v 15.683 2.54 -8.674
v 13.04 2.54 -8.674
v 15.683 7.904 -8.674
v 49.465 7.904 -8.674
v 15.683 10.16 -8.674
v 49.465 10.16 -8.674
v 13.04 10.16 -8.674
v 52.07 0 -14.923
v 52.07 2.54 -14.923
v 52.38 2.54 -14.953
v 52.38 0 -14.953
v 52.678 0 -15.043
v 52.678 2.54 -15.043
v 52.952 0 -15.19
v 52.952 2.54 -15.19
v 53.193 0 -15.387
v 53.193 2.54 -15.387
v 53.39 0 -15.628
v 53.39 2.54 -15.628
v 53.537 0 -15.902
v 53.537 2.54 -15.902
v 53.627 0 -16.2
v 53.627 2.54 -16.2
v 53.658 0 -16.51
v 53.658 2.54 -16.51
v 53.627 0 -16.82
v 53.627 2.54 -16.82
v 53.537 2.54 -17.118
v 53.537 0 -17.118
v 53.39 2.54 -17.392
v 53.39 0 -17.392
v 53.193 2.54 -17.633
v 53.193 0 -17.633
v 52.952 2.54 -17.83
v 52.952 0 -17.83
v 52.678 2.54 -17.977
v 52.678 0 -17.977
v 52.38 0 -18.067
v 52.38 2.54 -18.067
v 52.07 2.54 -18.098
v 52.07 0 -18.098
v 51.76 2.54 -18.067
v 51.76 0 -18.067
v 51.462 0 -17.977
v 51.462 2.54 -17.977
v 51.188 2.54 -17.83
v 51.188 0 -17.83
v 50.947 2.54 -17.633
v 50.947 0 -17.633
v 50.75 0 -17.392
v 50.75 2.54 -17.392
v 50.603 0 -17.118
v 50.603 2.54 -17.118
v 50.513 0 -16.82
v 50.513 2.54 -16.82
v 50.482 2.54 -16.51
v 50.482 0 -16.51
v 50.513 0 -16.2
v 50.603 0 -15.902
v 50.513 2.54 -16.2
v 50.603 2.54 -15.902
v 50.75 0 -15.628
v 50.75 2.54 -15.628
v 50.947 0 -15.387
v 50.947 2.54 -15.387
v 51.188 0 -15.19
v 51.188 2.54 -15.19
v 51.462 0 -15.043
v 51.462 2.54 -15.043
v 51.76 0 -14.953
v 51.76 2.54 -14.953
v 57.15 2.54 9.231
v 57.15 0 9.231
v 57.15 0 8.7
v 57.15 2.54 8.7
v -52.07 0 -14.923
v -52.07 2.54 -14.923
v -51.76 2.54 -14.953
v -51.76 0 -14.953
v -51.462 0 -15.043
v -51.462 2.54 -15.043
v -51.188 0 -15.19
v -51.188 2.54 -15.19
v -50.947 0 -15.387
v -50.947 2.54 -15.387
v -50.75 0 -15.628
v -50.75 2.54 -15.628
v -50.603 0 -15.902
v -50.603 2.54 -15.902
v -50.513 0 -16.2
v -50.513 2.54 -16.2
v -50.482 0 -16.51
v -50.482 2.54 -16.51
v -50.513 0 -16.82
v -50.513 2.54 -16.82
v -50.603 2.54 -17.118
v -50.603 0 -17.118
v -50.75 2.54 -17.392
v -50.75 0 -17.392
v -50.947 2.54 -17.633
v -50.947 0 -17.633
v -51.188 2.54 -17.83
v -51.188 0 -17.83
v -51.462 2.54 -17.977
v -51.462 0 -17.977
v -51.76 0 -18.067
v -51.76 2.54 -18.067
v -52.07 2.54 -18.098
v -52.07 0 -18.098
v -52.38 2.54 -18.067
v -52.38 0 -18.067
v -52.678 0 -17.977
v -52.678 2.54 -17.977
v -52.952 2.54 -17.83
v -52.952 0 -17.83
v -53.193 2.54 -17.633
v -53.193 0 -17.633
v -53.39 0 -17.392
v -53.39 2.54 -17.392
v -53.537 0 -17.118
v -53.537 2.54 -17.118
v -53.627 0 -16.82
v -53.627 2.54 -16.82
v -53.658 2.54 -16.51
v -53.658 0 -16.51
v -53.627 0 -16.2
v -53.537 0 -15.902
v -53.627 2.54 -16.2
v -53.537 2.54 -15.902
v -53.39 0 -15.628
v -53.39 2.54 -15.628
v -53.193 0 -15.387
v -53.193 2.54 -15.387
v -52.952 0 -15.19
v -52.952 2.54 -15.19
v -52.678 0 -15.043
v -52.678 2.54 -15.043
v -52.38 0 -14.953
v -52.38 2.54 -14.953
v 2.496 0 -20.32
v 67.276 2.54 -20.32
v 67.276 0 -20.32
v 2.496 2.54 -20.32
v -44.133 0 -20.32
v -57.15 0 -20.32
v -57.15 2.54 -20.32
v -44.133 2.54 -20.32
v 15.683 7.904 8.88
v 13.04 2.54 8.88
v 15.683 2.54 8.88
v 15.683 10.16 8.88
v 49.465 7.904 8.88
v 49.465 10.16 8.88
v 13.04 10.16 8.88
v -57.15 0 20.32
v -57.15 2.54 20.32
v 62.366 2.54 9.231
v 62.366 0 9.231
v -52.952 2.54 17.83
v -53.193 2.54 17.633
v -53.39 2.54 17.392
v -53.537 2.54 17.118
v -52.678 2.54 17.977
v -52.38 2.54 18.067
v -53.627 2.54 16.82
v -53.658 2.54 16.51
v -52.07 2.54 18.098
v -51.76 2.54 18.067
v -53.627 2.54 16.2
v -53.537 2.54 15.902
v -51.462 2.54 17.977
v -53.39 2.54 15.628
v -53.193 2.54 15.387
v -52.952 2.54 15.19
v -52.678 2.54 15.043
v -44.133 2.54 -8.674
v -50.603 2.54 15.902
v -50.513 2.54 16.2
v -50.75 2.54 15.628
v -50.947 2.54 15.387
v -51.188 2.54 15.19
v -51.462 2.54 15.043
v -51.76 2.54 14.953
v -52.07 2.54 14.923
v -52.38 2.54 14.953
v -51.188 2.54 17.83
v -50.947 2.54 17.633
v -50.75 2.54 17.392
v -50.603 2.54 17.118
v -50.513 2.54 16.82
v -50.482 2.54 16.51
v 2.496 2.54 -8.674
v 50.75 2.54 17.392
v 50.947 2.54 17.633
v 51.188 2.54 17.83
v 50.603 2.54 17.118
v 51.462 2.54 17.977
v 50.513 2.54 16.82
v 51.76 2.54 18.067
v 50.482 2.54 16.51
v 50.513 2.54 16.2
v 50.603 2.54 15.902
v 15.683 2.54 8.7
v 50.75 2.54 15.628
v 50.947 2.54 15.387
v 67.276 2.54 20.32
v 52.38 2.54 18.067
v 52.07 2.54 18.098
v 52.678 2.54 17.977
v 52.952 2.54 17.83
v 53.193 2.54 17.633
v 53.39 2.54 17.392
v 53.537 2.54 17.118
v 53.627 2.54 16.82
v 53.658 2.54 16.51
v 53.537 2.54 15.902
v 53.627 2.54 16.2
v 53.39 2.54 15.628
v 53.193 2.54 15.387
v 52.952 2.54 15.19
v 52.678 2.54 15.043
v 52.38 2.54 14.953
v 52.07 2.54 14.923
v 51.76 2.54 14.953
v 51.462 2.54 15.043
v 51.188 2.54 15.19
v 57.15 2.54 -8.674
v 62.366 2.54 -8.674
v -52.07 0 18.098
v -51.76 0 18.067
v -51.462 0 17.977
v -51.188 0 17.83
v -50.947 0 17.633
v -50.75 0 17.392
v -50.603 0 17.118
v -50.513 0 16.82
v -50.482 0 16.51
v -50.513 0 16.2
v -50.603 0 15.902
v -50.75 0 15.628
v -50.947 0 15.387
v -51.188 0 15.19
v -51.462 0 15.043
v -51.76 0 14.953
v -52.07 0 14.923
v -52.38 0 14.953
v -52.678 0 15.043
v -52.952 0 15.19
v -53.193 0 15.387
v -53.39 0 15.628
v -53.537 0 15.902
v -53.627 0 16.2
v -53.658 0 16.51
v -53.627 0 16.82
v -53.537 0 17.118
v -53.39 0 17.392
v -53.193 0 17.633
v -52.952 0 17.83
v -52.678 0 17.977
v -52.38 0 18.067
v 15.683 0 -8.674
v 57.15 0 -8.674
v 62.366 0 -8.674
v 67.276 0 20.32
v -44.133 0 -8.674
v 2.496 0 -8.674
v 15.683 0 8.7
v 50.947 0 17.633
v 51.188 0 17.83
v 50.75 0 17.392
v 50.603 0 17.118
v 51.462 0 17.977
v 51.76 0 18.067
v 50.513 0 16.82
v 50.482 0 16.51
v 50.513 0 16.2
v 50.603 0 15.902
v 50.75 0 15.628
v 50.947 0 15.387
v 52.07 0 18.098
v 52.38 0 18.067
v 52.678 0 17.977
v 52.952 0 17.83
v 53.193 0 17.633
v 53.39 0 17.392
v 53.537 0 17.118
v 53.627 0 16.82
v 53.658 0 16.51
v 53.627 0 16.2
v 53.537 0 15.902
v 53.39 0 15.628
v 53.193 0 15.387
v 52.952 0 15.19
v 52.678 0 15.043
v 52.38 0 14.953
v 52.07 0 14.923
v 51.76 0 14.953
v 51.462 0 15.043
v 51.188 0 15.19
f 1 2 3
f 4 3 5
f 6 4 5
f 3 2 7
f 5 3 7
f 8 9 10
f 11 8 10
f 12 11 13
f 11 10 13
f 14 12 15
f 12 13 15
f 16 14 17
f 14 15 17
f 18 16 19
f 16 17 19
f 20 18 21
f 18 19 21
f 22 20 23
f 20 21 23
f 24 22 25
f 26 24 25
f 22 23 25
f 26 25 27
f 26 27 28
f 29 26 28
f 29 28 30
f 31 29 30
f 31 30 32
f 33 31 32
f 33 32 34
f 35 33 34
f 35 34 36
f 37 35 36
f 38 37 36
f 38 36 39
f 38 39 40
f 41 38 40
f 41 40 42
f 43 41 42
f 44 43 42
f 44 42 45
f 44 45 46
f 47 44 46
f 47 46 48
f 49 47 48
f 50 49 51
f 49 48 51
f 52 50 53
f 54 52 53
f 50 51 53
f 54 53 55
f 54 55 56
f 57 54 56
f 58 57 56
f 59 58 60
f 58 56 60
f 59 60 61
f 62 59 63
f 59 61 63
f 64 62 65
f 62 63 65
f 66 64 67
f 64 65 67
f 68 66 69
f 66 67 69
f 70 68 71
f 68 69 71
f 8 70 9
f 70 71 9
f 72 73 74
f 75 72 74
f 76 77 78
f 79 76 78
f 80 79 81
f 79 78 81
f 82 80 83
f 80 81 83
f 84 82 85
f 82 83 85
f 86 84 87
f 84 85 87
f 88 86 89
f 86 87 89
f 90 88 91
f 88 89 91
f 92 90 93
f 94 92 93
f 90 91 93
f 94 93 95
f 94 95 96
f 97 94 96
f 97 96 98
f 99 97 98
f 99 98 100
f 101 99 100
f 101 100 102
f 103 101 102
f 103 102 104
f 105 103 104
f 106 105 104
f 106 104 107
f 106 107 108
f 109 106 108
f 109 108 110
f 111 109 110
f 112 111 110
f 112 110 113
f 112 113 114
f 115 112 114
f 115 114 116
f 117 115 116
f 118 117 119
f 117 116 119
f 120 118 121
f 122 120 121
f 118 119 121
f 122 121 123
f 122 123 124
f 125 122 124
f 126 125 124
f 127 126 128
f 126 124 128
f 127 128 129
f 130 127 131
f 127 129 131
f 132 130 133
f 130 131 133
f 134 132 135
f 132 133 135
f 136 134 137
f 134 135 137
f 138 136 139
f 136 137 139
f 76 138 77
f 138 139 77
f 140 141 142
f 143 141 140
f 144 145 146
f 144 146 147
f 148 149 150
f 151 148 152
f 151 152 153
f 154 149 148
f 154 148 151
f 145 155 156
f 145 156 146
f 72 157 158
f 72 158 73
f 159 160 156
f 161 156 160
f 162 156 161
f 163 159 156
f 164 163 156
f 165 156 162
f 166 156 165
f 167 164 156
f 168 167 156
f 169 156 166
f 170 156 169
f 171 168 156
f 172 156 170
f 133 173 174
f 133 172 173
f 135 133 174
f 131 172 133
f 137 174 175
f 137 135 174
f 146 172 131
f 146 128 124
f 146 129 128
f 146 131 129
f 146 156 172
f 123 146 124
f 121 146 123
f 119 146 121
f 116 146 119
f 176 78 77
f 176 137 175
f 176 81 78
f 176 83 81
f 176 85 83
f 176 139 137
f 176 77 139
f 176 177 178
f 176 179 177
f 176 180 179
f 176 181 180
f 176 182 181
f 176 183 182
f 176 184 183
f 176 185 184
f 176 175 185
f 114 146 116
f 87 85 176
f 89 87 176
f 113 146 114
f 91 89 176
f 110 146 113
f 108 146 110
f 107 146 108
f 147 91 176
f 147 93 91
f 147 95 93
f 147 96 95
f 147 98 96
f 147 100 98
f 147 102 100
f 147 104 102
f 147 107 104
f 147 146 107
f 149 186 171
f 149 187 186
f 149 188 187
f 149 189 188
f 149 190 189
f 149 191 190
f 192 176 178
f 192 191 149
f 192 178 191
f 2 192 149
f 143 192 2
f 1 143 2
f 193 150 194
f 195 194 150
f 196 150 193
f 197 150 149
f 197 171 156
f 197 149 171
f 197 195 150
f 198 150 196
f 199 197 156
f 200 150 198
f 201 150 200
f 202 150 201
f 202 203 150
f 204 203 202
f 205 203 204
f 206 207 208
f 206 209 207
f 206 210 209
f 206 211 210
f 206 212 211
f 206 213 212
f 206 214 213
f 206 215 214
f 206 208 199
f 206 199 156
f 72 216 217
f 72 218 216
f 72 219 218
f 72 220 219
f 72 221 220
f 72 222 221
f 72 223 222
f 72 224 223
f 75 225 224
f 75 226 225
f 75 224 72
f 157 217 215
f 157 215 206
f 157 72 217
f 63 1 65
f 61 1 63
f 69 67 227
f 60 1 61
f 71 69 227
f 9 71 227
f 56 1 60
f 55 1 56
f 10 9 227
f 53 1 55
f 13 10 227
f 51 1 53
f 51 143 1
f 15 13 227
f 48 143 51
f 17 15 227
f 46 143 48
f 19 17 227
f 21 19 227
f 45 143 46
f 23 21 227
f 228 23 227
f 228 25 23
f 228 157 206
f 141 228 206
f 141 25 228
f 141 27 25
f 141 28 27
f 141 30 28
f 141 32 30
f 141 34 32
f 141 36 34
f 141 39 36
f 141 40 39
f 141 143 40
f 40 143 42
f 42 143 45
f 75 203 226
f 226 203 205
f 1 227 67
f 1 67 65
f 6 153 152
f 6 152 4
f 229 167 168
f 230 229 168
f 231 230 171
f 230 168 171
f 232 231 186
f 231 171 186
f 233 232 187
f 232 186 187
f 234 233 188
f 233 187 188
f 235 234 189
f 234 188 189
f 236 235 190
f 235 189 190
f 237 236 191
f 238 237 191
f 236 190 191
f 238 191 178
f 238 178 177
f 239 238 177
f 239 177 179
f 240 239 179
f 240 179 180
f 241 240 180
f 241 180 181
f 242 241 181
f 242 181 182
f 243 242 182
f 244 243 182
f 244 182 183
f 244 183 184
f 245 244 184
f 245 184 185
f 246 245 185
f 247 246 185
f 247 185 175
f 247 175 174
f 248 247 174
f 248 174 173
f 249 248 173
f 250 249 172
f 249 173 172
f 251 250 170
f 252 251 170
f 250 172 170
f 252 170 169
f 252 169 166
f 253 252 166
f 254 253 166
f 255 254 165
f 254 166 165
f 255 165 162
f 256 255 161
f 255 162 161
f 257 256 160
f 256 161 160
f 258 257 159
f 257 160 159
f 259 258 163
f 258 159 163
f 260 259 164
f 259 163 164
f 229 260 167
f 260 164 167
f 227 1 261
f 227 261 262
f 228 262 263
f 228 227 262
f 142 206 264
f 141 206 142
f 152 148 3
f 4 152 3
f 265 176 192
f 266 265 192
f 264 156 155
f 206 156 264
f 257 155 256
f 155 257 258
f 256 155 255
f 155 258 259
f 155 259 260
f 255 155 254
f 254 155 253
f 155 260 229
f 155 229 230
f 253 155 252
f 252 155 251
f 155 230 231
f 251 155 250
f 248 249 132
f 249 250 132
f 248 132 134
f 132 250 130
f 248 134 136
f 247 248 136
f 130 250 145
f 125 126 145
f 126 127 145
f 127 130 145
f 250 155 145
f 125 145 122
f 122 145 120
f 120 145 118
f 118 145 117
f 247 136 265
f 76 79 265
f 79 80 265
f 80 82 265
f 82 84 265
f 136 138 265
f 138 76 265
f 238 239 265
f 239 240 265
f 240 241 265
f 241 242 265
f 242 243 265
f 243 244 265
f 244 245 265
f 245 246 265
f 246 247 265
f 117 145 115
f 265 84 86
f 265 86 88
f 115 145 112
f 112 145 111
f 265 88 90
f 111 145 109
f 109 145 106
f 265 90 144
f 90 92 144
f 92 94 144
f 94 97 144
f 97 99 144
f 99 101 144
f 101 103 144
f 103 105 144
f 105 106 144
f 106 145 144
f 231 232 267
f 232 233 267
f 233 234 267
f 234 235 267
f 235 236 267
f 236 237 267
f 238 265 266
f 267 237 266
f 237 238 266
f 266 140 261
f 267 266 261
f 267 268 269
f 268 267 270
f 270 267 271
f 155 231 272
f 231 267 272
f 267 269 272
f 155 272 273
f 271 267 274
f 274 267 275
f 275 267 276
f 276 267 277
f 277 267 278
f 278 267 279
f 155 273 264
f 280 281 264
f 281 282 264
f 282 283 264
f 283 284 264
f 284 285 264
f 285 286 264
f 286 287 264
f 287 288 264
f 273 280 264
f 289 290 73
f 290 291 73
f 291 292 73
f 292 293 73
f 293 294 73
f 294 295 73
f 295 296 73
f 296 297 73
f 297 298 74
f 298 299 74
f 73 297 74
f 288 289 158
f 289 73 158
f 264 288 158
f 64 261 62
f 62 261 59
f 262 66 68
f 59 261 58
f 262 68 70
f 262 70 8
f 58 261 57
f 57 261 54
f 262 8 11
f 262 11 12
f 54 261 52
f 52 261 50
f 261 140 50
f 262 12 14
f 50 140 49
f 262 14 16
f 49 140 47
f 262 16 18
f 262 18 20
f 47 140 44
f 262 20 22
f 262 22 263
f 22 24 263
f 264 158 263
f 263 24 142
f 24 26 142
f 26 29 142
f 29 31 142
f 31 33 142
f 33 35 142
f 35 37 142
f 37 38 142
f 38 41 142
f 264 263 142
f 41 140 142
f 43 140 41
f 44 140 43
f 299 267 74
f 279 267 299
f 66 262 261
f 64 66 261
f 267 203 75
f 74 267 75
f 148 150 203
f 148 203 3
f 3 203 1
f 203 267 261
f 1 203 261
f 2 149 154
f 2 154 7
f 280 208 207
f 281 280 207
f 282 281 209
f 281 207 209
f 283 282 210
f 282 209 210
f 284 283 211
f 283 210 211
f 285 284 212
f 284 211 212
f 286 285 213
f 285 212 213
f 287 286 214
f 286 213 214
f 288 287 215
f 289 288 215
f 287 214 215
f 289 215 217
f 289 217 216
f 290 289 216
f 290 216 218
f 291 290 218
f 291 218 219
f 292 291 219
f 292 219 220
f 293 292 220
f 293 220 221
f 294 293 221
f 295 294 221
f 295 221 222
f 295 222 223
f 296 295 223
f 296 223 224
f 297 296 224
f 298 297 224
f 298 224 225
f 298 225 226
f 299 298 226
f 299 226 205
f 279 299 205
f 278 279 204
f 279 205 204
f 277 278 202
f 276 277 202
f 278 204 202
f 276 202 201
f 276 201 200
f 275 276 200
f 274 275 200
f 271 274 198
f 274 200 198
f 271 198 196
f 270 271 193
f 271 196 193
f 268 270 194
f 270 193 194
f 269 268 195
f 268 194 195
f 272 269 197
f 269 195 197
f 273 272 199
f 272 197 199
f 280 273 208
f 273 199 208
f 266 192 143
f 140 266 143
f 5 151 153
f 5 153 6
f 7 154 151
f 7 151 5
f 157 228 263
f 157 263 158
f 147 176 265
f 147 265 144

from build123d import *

# Parameters (mm, degrees)
SKETCH1_W           = 114.3
SKETCH1_H           = 40.64
BOSS_EXTRUDE1_DEPTH = 2.54
SKETCH2_R           = 1.5875
CUT_EXTRUDE2_DEPTH  = 61.708125486
SKETCH3_W           = 43.201910461
SKETCH3_H           = 17.373570515
SKETCH3_W_2         = 46.628586193
SKETCH3_H_2         = 22.401940477
CUT_EXTRUDE3_DEPTH  = 61.708125486
SKETCH4_W           = 2.643760601
SKETCH4_H           = 17.553517305
BOSS_EXTRUDE2_DEPTH = 7.62
SKETCH5_W           = 17.553517305
SKETCH5_H           = 2.255880329
BOSS_EXTRUDE3_DEPTH = 33.782
BOSS_EXTRUDE4_DEPTH = 2.54


with BuildPart() as part:
    # Sketch1 → Boss-Extrude1 (new body)
    with BuildSketch(Plane(origin=(0, 0, 0), x_dir=(1, 0, 0), z_dir=(0, 1, 0))):
        Rectangle(SKETCH1_W, SKETCH1_H)
    extrude(amount=BOSS_EXTRUDE1_DEPTH)

    # Sketch2 → Cut-Extrude2 (cut, through all)
    with BuildSketch(Plane(origin=(0, 2.54, 0), x_dir=(1, 0, 0), z_dir=(0, 1, 0))):
        with Locations(Location((-52.07, 16.51, 0), (0, 0, 270))):
            Circle(SKETCH2_R)
        with Locations(Location((52.07, 16.51, 0), (0, 0, 270))):
            Circle(SKETCH2_R)
        with Locations(Location((52.07, -16.51, 0), (0, 0, 270))):
            Circle(SKETCH2_R)
        with Locations(Location((-52.07, -16.51, 0), (0, 0, 270))):
            Circle(SKETCH2_R)
    extrude(amount=-CUT_EXTRUDE2_DEPTH, mode=Mode.SUBTRACT)

    # Sketch3 → Cut-Extrude3 (cut, through all)
    with BuildSketch(Plane(origin=(0, 2.54, 0), x_dir=(1, 0, 0), z_dir=(0, 1, 0))):
        with Locations((37.284400117, -0.013259404)):
            Rectangle(SKETCH3_W, SKETCH3_H)
        with Locations((-20.818521539, 19.874496091)):
            Rectangle(SKETCH3_W_2, SKETCH3_H_2)
    extrude(amount=-CUT_EXTRUDE3_DEPTH, mode=Mode.SUBTRACT)

    # Sketch4 → Boss-Extrude2 (add)
    with BuildSketch(Plane(origin=(0, 2.54, 0), x_dir=(1, 0, 0), z_dir=(0, 1, 0))):
        with Locations((14.361564587, -0.103232799)):
            Rectangle(SKETCH4_W, SKETCH4_H)
    extrude(amount=BOSS_EXTRUDE2_DEPTH)

    # Sketch5 → Boss-Extrude3 (add)
    with BuildSketch(Plane(origin=(15.683444887, 0, 0), x_dir=(0, 0, -1), z_dir=(1, 0, 0))):
        with Locations((-0.103232799, 9.032059836)):
            Rectangle(SKETCH5_W, SKETCH5_H)
    extrude(amount=BOSS_EXTRUDE3_DEPTH)

    # Sketch6 → Boss-Extrude4 (add)
    with BuildSketch(Plane(origin=(0, 2.54, 0), x_dir=(1, 0, 0), z_dir=(0, 1, 0))):
        Polygon((57.15, 20.32), (57.15, 8.673525853), (62.36601956, 8.673525853), (62.36601956, -9.230657654), (57.15, -9.230657654), (57.15, -20.32), (67.276494875, -20.32), (67.276494875, 20.32), align=None)
    extrude(amount=-BOSS_EXTRUDE4_DEPTH)


solid = part.part
